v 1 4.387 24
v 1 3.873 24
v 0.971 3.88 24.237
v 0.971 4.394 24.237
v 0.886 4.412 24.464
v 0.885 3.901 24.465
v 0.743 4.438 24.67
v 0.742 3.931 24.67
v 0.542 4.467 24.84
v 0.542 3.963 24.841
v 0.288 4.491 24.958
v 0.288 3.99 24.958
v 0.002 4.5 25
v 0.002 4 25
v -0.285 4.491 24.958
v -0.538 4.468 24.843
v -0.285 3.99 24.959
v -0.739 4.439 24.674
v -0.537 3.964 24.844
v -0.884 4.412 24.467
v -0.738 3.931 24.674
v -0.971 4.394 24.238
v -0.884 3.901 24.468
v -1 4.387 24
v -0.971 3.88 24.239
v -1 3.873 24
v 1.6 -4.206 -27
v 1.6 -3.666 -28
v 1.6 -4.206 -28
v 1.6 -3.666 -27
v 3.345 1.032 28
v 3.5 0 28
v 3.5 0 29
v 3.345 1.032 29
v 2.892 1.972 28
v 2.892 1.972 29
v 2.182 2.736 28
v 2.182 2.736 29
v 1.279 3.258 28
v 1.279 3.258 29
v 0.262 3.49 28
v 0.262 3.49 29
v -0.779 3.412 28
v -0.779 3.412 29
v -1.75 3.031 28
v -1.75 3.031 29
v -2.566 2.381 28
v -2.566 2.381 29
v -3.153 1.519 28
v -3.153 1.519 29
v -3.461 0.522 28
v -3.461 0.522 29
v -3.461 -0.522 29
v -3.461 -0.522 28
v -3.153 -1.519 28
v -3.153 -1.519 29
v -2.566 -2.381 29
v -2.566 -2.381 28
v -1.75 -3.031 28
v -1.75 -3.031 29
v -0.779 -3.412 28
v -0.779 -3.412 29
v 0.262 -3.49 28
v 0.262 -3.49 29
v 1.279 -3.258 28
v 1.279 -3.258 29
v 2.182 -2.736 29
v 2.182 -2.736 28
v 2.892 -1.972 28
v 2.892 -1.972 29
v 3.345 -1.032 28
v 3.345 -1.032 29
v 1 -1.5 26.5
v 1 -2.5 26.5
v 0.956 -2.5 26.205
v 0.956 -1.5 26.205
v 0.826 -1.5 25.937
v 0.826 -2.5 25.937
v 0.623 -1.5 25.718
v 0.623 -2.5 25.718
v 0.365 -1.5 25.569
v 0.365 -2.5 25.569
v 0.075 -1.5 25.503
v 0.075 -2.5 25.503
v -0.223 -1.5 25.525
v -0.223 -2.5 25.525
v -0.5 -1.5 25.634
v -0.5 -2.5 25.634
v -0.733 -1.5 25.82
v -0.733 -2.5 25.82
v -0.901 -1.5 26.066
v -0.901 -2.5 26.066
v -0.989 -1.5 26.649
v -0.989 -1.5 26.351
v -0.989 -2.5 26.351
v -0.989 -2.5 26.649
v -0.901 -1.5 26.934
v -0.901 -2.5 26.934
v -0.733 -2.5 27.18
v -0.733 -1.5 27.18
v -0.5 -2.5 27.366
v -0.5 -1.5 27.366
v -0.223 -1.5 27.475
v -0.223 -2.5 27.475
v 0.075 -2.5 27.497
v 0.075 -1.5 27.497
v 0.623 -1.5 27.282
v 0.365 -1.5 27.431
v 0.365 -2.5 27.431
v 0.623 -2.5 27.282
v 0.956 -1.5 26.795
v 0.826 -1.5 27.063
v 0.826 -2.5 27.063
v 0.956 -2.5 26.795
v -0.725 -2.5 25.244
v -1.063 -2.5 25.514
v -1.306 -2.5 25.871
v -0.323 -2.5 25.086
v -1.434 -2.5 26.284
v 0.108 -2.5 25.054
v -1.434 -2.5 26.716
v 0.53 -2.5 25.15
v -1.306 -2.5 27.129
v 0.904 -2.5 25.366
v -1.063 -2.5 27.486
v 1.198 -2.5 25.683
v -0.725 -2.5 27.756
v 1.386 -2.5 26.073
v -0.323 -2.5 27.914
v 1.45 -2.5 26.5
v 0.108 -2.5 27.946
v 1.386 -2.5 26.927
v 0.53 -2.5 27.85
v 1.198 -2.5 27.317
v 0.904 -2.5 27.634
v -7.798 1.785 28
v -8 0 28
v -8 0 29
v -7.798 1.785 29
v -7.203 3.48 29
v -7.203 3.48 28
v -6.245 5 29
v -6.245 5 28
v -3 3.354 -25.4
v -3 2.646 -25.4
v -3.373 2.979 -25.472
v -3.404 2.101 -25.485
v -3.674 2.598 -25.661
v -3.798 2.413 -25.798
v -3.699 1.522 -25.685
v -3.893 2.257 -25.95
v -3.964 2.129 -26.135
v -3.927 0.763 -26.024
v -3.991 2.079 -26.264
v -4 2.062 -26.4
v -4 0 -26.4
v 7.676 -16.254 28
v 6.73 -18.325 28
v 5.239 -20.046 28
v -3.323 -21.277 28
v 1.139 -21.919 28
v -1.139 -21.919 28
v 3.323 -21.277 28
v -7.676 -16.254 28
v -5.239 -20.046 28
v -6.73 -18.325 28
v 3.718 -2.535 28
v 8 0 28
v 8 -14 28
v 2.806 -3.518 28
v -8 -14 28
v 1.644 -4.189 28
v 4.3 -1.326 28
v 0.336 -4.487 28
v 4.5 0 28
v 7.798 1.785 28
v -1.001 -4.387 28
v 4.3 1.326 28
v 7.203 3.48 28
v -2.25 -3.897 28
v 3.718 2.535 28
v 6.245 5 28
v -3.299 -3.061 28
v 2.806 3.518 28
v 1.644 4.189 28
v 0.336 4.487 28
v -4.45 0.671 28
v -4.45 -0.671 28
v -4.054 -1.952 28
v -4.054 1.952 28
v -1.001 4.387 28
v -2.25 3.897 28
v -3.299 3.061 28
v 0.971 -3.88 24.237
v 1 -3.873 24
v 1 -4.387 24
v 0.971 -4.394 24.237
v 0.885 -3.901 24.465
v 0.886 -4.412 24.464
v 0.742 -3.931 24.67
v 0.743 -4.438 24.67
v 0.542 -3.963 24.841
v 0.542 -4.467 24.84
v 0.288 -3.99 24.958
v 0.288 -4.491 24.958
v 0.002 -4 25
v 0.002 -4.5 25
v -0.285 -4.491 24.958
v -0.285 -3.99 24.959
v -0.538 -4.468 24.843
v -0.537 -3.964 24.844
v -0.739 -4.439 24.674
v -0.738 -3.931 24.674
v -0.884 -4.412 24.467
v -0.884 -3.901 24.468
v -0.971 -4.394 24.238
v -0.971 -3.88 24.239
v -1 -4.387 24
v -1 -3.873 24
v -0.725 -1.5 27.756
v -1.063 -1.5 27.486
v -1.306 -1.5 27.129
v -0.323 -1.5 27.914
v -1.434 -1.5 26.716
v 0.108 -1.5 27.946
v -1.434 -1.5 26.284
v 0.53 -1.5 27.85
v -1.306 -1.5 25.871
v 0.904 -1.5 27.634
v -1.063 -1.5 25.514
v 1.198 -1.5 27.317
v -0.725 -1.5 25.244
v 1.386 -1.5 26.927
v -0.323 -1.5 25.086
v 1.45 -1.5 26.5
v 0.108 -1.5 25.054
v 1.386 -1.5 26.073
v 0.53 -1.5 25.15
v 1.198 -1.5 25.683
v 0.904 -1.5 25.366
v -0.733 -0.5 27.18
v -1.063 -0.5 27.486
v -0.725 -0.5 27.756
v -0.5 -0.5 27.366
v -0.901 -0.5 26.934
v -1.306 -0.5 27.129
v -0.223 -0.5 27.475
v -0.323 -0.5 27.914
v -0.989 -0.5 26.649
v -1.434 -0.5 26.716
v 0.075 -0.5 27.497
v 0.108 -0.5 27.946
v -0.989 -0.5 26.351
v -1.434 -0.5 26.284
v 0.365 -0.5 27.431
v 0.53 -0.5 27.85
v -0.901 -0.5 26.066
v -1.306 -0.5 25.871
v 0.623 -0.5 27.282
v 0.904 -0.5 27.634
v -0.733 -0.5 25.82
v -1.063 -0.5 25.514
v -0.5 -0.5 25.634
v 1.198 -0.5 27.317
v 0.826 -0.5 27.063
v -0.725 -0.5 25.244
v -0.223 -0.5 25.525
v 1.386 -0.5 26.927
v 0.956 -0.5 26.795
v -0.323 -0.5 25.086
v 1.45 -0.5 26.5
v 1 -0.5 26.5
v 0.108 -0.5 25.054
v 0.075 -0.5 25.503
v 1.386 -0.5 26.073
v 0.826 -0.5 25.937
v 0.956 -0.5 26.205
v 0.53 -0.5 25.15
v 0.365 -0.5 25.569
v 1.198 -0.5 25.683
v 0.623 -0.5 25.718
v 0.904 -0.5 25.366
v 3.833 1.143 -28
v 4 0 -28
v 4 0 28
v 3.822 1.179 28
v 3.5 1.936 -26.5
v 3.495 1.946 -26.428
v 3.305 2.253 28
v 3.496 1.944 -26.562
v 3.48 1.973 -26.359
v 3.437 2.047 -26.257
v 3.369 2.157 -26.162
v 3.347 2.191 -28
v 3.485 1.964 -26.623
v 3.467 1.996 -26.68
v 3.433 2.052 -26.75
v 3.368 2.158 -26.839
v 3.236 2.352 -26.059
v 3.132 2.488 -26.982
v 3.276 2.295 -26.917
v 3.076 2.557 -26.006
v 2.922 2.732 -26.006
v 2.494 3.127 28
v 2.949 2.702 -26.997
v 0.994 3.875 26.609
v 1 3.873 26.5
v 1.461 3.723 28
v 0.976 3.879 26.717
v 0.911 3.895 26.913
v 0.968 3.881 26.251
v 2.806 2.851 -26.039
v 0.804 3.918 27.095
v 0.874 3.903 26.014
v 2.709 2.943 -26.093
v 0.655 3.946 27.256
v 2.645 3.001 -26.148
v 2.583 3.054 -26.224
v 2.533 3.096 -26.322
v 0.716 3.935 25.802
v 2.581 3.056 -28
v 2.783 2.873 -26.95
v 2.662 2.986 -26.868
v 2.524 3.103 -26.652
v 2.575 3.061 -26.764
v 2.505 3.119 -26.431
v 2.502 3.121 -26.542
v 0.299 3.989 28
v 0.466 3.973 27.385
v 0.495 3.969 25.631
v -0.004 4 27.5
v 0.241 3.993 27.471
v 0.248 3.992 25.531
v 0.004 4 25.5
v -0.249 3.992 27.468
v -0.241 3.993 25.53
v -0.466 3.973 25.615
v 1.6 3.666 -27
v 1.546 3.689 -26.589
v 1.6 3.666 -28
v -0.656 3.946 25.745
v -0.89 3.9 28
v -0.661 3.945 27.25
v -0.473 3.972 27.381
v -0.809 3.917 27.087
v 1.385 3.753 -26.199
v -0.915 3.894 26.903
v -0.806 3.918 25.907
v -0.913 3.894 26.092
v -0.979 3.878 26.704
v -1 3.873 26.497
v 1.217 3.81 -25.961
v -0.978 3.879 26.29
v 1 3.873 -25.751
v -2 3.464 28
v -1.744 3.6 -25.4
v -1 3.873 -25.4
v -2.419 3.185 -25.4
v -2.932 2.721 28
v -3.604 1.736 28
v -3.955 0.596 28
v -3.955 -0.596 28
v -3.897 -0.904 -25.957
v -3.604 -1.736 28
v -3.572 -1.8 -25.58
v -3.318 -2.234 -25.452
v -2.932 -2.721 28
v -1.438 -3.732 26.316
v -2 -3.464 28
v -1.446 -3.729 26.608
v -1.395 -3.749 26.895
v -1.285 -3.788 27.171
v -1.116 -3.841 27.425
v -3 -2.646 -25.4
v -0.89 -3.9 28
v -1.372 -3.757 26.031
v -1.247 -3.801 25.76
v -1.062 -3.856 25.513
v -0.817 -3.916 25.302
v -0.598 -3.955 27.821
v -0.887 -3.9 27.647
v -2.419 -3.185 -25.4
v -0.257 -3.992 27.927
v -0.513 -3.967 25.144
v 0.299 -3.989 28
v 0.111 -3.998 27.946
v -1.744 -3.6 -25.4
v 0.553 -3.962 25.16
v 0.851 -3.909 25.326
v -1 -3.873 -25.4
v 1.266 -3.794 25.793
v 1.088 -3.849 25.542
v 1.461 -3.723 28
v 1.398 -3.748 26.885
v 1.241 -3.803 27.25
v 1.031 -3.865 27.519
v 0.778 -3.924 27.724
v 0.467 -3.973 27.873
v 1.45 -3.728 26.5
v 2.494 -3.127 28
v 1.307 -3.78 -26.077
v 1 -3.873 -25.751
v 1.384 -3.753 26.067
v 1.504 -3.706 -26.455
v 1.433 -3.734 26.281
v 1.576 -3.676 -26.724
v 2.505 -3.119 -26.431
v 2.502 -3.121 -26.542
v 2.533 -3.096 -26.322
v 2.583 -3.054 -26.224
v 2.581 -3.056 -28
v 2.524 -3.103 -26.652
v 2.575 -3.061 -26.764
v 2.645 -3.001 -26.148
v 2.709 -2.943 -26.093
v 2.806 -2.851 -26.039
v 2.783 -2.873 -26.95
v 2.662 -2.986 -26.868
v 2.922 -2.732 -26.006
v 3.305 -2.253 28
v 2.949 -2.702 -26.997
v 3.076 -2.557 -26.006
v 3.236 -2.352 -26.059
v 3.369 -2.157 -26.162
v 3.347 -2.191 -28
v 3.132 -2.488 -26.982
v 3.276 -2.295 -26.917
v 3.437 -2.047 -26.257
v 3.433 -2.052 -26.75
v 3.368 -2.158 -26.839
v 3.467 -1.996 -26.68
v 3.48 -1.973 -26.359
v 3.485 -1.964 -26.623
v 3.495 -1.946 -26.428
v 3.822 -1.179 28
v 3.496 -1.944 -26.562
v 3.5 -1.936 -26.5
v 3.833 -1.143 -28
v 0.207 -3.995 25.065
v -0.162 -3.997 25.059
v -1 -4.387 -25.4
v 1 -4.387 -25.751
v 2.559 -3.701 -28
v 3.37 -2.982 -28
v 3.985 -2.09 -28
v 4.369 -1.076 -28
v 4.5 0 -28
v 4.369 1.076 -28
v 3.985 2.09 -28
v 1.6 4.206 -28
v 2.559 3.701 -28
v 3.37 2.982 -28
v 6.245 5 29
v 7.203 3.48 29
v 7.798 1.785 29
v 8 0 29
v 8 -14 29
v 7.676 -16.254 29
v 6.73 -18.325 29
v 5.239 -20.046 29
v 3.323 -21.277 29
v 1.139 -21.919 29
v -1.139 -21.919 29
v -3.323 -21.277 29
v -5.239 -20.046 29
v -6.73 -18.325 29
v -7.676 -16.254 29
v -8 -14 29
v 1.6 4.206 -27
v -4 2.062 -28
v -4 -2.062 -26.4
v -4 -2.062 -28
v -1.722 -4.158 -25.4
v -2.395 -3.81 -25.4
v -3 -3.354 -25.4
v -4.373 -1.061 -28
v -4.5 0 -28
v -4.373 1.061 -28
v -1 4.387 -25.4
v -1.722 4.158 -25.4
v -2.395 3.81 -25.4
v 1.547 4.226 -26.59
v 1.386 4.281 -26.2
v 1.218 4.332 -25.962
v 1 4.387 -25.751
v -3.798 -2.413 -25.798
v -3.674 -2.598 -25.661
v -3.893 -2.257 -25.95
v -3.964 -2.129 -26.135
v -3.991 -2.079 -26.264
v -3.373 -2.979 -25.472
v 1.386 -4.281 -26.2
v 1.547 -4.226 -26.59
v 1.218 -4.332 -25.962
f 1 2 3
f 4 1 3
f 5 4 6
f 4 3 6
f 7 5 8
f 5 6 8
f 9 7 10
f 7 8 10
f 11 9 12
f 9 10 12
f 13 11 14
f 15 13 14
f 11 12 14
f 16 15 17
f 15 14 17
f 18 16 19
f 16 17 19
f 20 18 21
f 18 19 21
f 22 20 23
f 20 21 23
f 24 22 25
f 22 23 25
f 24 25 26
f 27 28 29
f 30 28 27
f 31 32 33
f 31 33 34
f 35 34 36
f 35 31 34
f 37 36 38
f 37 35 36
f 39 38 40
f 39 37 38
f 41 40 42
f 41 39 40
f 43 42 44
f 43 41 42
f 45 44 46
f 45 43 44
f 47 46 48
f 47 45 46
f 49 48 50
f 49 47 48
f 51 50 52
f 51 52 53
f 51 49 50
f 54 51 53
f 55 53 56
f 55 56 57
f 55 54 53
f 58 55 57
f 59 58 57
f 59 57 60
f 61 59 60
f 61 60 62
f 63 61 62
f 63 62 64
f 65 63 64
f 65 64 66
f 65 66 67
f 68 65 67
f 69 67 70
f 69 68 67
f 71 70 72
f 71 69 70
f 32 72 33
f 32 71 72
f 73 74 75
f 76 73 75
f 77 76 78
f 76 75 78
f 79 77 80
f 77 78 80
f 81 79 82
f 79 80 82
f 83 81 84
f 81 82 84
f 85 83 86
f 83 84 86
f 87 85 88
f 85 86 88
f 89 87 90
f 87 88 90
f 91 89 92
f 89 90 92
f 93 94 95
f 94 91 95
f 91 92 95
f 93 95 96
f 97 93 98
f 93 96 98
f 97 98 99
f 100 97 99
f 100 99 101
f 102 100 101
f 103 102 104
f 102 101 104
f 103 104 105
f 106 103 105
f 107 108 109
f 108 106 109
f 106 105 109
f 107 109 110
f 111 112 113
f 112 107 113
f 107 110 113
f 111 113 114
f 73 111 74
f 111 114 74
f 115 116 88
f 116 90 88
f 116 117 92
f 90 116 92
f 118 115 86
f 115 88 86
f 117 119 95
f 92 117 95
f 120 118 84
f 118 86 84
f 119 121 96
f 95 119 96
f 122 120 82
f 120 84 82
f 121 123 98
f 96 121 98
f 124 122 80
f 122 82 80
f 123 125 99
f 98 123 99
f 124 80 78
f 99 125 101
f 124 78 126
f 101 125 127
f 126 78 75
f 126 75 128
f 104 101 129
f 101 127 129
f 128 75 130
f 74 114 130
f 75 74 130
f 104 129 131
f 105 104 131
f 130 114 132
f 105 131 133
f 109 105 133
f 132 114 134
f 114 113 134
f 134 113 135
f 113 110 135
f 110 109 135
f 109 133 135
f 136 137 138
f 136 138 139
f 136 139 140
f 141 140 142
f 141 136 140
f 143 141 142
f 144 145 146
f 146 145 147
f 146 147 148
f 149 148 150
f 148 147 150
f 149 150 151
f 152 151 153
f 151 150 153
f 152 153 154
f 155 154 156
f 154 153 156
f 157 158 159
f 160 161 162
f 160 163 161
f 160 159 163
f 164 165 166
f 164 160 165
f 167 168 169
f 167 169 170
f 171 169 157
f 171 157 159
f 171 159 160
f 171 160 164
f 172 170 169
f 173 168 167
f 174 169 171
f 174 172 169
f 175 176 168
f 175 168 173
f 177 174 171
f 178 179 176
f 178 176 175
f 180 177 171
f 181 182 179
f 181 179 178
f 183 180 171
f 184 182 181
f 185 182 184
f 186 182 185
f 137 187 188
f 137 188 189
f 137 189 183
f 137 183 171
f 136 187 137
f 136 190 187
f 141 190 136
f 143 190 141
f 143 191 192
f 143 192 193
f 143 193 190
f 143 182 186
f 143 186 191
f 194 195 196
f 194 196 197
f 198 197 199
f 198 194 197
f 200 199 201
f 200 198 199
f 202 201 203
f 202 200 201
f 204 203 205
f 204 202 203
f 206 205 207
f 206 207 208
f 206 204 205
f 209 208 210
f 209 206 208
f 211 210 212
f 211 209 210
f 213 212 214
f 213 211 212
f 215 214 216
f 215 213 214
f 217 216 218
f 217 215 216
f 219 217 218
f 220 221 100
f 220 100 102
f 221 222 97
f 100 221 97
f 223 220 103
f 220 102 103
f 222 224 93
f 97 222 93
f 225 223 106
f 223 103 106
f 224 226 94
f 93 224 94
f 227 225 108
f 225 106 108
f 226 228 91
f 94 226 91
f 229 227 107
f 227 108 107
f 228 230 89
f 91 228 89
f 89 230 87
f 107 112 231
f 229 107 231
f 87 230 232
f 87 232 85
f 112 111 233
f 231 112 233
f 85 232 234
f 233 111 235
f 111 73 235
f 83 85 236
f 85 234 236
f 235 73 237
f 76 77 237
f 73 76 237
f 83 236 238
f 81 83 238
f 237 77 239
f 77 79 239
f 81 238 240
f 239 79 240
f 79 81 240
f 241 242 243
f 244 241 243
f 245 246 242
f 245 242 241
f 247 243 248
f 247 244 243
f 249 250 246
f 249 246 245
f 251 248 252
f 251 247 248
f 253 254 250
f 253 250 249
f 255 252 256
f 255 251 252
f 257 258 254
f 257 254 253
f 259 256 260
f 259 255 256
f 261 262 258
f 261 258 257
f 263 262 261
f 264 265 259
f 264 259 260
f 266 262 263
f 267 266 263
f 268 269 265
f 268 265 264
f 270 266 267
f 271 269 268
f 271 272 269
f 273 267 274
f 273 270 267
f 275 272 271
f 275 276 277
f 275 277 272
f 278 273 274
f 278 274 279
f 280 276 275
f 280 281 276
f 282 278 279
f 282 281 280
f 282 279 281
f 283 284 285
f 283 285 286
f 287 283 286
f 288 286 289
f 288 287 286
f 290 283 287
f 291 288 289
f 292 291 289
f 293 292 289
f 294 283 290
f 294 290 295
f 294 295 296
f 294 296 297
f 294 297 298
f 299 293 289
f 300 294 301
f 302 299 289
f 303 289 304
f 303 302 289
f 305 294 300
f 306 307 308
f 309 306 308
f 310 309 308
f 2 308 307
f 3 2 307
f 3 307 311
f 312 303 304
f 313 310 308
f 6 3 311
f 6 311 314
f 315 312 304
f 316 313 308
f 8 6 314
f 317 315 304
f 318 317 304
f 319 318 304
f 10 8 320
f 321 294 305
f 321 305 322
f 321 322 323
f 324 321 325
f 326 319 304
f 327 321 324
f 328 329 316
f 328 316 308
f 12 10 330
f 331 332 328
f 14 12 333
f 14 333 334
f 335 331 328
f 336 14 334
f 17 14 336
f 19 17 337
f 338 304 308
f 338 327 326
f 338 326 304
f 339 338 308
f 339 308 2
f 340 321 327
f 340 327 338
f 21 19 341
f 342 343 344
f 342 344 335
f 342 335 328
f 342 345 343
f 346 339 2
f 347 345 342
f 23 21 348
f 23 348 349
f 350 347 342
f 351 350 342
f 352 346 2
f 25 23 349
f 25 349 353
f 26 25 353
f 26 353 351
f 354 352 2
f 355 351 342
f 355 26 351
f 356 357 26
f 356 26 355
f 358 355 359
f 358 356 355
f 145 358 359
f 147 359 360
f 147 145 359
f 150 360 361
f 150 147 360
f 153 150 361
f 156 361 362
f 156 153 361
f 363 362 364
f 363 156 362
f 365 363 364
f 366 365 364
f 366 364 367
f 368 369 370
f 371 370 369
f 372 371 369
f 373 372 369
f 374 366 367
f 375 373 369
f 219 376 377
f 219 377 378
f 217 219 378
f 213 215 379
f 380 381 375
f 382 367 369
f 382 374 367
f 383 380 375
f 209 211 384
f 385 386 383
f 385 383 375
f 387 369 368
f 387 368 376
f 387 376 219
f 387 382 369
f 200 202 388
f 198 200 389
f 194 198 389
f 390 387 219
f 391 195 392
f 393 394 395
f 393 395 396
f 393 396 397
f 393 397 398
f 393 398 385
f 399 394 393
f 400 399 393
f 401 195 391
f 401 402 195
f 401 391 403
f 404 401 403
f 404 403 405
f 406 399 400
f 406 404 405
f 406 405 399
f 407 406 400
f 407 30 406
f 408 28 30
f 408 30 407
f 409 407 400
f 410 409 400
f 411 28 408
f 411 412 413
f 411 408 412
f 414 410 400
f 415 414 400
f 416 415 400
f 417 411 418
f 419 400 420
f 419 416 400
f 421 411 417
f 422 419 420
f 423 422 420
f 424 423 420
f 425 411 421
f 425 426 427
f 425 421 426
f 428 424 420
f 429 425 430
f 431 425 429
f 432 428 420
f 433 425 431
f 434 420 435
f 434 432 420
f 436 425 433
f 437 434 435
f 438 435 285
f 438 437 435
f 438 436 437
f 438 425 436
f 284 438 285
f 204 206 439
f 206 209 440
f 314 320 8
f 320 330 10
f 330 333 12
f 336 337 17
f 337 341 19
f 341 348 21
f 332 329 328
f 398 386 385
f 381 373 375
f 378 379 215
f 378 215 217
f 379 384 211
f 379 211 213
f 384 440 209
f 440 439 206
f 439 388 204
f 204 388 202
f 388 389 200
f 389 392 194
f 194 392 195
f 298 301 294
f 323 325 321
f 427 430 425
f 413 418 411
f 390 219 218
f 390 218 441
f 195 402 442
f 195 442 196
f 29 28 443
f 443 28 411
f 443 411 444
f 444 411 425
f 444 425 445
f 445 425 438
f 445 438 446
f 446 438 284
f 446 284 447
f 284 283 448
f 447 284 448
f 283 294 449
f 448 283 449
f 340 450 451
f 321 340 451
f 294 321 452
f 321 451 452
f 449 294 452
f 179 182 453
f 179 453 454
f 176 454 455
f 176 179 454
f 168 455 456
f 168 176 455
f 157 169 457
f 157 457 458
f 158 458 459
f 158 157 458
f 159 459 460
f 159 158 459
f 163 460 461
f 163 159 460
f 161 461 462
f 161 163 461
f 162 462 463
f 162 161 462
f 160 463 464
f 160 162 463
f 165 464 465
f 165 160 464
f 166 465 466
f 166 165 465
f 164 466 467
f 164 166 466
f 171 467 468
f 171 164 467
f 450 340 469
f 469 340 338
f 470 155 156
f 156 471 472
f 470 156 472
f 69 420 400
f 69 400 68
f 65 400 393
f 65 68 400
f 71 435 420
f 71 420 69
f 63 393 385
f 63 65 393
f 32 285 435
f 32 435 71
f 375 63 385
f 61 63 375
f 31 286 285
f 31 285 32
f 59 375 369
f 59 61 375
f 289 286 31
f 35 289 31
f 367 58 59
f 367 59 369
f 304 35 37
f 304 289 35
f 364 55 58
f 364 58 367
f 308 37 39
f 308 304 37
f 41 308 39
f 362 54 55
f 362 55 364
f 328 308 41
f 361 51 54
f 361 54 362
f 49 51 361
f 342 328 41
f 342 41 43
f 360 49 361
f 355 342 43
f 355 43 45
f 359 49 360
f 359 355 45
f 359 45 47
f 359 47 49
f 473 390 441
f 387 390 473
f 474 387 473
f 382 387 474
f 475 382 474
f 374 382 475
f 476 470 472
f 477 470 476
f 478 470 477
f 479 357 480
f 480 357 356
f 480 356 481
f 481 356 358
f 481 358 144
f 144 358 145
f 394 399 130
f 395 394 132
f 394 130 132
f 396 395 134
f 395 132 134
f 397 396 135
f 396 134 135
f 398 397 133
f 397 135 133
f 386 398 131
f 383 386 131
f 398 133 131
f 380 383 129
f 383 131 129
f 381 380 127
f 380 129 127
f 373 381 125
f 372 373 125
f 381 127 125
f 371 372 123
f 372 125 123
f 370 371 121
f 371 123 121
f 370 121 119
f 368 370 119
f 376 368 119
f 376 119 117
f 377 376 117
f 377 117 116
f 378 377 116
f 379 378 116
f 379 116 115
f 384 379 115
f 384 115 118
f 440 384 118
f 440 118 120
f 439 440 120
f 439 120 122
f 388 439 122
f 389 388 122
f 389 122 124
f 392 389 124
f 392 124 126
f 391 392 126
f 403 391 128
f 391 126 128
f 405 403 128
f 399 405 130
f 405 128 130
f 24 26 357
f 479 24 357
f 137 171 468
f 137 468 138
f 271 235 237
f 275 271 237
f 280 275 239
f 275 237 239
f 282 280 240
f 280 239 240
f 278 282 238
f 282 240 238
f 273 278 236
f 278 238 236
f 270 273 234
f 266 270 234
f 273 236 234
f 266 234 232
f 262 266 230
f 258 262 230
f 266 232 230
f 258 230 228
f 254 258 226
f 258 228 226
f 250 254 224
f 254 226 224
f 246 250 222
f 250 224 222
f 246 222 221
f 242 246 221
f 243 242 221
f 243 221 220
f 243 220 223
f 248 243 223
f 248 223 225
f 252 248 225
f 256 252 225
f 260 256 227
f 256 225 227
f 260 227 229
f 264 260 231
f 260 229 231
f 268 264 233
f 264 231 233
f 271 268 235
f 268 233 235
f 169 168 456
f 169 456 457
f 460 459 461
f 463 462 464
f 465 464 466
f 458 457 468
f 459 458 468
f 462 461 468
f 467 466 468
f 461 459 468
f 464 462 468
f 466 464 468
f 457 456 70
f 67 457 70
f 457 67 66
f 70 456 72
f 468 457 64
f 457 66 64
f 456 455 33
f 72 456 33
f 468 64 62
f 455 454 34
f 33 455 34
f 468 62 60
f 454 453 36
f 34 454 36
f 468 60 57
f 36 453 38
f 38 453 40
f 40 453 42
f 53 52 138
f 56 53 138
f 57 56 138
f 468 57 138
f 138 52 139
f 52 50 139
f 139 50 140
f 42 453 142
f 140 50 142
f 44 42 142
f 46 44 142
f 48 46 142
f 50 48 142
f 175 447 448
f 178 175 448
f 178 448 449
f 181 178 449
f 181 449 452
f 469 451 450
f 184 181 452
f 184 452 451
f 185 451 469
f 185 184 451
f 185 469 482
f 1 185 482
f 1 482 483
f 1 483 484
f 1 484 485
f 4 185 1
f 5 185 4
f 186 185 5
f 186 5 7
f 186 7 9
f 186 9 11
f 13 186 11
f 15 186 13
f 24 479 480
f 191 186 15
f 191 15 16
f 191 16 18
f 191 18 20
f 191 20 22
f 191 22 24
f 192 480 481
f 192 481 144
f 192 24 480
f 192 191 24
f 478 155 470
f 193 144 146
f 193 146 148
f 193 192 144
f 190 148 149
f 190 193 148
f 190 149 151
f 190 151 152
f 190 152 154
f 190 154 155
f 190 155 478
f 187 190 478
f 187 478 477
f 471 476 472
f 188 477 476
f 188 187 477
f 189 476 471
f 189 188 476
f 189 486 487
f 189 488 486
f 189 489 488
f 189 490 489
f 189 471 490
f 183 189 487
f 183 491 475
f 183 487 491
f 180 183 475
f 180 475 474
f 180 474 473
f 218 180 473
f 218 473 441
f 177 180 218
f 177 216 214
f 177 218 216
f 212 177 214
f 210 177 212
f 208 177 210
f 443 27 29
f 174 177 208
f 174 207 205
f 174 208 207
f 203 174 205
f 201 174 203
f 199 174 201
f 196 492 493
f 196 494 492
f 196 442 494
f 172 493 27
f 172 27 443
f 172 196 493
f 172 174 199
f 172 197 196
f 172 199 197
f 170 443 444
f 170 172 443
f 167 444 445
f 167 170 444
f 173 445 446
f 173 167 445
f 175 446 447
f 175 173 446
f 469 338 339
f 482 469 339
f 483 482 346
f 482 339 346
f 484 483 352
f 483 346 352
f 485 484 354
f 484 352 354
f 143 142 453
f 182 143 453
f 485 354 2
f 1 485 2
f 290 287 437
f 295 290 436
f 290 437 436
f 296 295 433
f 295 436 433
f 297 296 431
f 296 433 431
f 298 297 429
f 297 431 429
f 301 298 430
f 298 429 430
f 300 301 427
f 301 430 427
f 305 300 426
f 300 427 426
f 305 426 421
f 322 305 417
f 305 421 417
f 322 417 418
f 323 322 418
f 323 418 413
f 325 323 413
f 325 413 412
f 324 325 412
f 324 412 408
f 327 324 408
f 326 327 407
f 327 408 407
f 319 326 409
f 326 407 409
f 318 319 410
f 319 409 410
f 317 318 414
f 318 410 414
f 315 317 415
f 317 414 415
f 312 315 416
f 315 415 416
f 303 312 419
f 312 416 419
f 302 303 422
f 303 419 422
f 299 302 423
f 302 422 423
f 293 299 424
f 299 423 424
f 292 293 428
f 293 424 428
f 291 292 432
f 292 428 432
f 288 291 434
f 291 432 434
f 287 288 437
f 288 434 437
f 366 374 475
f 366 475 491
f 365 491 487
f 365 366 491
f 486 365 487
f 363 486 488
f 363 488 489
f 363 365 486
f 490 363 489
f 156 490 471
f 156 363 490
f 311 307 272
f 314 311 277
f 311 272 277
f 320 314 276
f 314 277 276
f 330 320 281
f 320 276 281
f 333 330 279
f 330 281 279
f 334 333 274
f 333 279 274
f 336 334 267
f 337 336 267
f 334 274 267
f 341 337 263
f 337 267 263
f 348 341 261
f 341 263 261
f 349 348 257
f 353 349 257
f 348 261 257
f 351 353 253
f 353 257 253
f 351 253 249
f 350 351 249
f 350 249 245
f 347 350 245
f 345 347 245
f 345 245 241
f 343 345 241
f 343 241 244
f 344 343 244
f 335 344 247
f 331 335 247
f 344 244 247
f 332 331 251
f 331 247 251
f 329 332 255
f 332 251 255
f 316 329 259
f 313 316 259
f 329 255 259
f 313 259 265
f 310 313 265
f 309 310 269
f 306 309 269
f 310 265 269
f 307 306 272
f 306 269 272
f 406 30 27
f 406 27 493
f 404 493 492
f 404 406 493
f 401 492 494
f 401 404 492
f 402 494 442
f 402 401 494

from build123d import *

# Parameters (mm, degrees)
ESQUISSE1_R                    = 4.5
ESQUISSE1_R_2                  = 4
BOSS_EXTRU_1_DEPTH             = 28
BOSS_EXTRU_2_REACH             = 6.5
ESQUISSE2_R                    = 1
ESQUISSE2_R_2                  = 0.5
BOSS_EXTRU_2_DIRECTION_2_REACH = 6.5
ENL_V_MAT_EXTRU_1_DEPTH        = 5.5
ENL_V_MAT_EXTRU_1_DEPTH_BACK   = 5.5
ESQUISSE4_R                    = 3.5
BOSS_EXTRU_3_DEPTH             = 1
ESQUISSE6_OUTSIDE_W            = 31.274
ESQUISSE6_OUTSIDE_H            = 45.274
ESQUISSE6_OUTSIDE_W_2          = 16
ESQUISSE6_OUTSIDE_H_2          = 27
ENL_V_MAT_EXTRU_2_DEPTH        = 58.0000001
BOSS_EXTRU_6_START             = -1.5
ESQUISSE7_R                    = 1.45
BOSS_EXTRU_6_DEPTH             = 1
BOSS_EXTRU_7_REACH             = 23.5
BOSS_EXTRU_7_START             = 1
ESQUISSE8_R                    = 1.45
ENL_V_MAT_EXTRU_3_DEPTH        = 6
ENL_V_MAT_EXTRU_3_DEPTH_BACK   = 23


with BuildPart() as part:
    # Esquisse1 → Boss.-Extru.1 (new body, symmetric)
    with BuildSketch(Plane.XY):
        Circle(ESQUISSE1_R)
        Circle(ESQUISSE1_R_2, mode=Mode.SUBTRACT)
    extrude(amount=BOSS_EXTRU_1_DEPTH, both=True)

    # Esquisse2 → Boss.-Extru.2 (add, up to next)
    with BuildSketch(Plane(origin=(0, 0, 0), x_dir=(1, 0, 0), z_dir=(0, 1, 0)), mode=Mode.PRIVATE) as boss_extru_2_sk1:
        with Locations((0, -26.5)):
            Circle(ESQUISSE2_R)
    boss_extru_2_tool1 = extrude(boss_extru_2_sk1.sketch, amount=BOSS_EXTRU_2_REACH, mode=Mode.PRIVATE) - part.part
    add(boss_extru_2_tool1.solids().sort_by_distance((0, 0, 26.5))[0])
    # Esquisse2 → Boss.-Extru.2 (add, up to next)
    with BuildSketch(Plane(origin=(0, 0, 0), x_dir=(1, 0, 0), z_dir=(0, 1, 0)), mode=Mode.PRIVATE) as boss_extru_2_sk2:
        with Locations((3, 26.5)):
            Circle(ESQUISSE2_R_2)
    boss_extru_2_tool2 = extrude(boss_extru_2_sk2.sketch, amount=BOSS_EXTRU_2_REACH, mode=Mode.PRIVATE) - part.part
    add(boss_extru_2_tool2.solids().sort_by_distance((3, 0, -26.5))[0])

    # Esquisse2 → Boss.-Extru.2 direction 2 (add, up to next)
    with BuildSketch(Plane(origin=(0, 0, 0), x_dir=(1, 0, 0), z_dir=(0, 1, 0)), mode=Mode.PRIVATE) as boss_extru_2_direction_2_sk1:
        with Locations((0, -26.5)):
            Circle(ESQUISSE2_R)
    boss_extru_2_direction_2_tool1 = extrude(boss_extru_2_direction_2_sk1.sketch, amount=-BOSS_EXTRU_2_DIRECTION_2_REACH, mode=Mode.PRIVATE) - part.part
    add(boss_extru_2_direction_2_tool1.solids().sort_by_distance((0, 0, 26.5))[0])
    # Esquisse2 → Boss.-Extru.2 direction 2 (add, up to next)
    with BuildSketch(Plane(origin=(0, 0, 0), x_dir=(1, 0, 0), z_dir=(0, 1, 0)), mode=Mode.PRIVATE) as boss_extru_2_direction_2_sk2:
        with Locations((3, 26.5)):
            Circle(ESQUISSE2_R_2)
    boss_extru_2_direction_2_tool2 = extrude(boss_extru_2_direction_2_sk2.sketch, amount=-BOSS_EXTRU_2_DIRECTION_2_REACH, mode=Mode.PRIVATE) - part.part
    add(boss_extru_2_direction_2_tool2.solids().sort_by_distance((3, 0, -26.5))[0])

    # Esquisse3 → Enlèv. mat.-Extru.1 (cut, two sides)
    with BuildSketch(Plane(origin=(0, 0, 0), x_dir=(1, 0, 0), z_dir=(0, 1, 0))) as enl_v_mat_extru_1_sk:
        with BuildLine():
            Line((1, 28), (1, -24))
            ThreePointArc((1, -24), (0, -25), (-1, -24))
            Line((-1, -24), (-1, 28))
            ThreePointArc((-1, 28), (0, 29), (1, 28))
        make_face()
    extrude(amount=ENL_V_MAT_EXTRU_1_DEPTH, mode=Mode.SUBTRACT)
    extrude(enl_v_mat_extru_1_sk.sketch, amount=-ENL_V_MAT_EXTRU_1_DEPTH_BACK, mode=Mode.SUBTRACT)

    # Esquisse4 → Boss.-Extru.3 (add)
    with BuildSketch(Plane.XY.offset(28)):
        with BuildLine():
            Line((8, 0), (8, -14))
            ThreePointArc((8, -14), (0, -22), (-8, -14))
            Line((-8, -14), (-8, 0))
            ThreePointArc((-8, 0), (0, 8), (8, 0))
        make_face()
        Circle(ESQUISSE4_R, mode=Mode.SUBTRACT)
    extrude(amount=BOSS_EXTRU_3_DEPTH)

    # Esquisse6 outside → Enlèv. mat.-Extru.2 (cut, through all)
    with BuildSketch(Plane.XY.offset(29)):
        with Locations((0, -7)):
            Rectangle(ESQUISSE6_OUTSIDE_W, ESQUISSE6_OUTSIDE_H)
        with Locations((0, -8.5)):
            Rectangle(ESQUISSE6_OUTSIDE_W_2, ESQUISSE6_OUTSIDE_H_2, mode=Mode.SUBTRACT)
    extrude(amount=-ENL_V_MAT_EXTRU_2_DEPTH, mode=Mode.SUBTRACT)

    # Esquisse7 → Boss.-Extru.6 (add)
    with BuildSketch(Plane(origin=(0, 0, 0), x_dir=(1, 0, 0), z_dir=(0, 1, 0)).offset(BOSS_EXTRU_6_START)):
        with Locations((0, -26.5)):
            Circle(ESQUISSE7_R)
    extrude(amount=BOSS_EXTRU_6_DEPTH)

    # Esquisse8 → Boss.-Extru.7 (add, up to next)
    with BuildSketch(Plane.XZ.offset(1.5).offset(BOSS_EXTRU_7_START), mode=Mode.PRIVATE) as boss_extru_7_sk1:
        with Locations((0, 26.5)):
            Circle(ESQUISSE8_R)
    boss_extru_7_tool1 = extrude(boss_extru_7_sk1.sketch, amount=BOSS_EXTRU_7_REACH, mode=Mode.PRIVATE) - part.part
    add(boss_extru_7_tool1.solids().sort_by_distance((0, -2.5, 26.5))[0])

    # Esquisse9 → Enlèv. mat.-Extru.3 (cut, two sides)
    with BuildSketch(Plane(origin=(0, 0, 0), x_dir=(1, 0, 0), z_dir=(0, 1, 0))) as enl_v_mat_extru_3_sk:
        with BuildLine():
            Line((0, 25.4), (-3, 25.4))
            ThreePointArc((-3, 25.4), (-3.707106781, 25.692893219), (-4, 26.4))
            Line((-4, 26.4), (-4, 28))
            Line((-4, 28), (1.6, 28))
            Line((1.6, 28), (1.6, 27))
            ThreePointArc((1.6, 27), (1.13137085, 25.86862915), (0, 25.4))
        make_face()
    extrude(amount=ENL_V_MAT_EXTRU_3_DEPTH, mode=Mode.SUBTRACT)
    extrude(enl_v_mat_extru_3_sk.sketch, amount=-ENL_V_MAT_EXTRU_3_DEPTH_BACK, mode=Mode.SUBTRACT)


solid = part.part
